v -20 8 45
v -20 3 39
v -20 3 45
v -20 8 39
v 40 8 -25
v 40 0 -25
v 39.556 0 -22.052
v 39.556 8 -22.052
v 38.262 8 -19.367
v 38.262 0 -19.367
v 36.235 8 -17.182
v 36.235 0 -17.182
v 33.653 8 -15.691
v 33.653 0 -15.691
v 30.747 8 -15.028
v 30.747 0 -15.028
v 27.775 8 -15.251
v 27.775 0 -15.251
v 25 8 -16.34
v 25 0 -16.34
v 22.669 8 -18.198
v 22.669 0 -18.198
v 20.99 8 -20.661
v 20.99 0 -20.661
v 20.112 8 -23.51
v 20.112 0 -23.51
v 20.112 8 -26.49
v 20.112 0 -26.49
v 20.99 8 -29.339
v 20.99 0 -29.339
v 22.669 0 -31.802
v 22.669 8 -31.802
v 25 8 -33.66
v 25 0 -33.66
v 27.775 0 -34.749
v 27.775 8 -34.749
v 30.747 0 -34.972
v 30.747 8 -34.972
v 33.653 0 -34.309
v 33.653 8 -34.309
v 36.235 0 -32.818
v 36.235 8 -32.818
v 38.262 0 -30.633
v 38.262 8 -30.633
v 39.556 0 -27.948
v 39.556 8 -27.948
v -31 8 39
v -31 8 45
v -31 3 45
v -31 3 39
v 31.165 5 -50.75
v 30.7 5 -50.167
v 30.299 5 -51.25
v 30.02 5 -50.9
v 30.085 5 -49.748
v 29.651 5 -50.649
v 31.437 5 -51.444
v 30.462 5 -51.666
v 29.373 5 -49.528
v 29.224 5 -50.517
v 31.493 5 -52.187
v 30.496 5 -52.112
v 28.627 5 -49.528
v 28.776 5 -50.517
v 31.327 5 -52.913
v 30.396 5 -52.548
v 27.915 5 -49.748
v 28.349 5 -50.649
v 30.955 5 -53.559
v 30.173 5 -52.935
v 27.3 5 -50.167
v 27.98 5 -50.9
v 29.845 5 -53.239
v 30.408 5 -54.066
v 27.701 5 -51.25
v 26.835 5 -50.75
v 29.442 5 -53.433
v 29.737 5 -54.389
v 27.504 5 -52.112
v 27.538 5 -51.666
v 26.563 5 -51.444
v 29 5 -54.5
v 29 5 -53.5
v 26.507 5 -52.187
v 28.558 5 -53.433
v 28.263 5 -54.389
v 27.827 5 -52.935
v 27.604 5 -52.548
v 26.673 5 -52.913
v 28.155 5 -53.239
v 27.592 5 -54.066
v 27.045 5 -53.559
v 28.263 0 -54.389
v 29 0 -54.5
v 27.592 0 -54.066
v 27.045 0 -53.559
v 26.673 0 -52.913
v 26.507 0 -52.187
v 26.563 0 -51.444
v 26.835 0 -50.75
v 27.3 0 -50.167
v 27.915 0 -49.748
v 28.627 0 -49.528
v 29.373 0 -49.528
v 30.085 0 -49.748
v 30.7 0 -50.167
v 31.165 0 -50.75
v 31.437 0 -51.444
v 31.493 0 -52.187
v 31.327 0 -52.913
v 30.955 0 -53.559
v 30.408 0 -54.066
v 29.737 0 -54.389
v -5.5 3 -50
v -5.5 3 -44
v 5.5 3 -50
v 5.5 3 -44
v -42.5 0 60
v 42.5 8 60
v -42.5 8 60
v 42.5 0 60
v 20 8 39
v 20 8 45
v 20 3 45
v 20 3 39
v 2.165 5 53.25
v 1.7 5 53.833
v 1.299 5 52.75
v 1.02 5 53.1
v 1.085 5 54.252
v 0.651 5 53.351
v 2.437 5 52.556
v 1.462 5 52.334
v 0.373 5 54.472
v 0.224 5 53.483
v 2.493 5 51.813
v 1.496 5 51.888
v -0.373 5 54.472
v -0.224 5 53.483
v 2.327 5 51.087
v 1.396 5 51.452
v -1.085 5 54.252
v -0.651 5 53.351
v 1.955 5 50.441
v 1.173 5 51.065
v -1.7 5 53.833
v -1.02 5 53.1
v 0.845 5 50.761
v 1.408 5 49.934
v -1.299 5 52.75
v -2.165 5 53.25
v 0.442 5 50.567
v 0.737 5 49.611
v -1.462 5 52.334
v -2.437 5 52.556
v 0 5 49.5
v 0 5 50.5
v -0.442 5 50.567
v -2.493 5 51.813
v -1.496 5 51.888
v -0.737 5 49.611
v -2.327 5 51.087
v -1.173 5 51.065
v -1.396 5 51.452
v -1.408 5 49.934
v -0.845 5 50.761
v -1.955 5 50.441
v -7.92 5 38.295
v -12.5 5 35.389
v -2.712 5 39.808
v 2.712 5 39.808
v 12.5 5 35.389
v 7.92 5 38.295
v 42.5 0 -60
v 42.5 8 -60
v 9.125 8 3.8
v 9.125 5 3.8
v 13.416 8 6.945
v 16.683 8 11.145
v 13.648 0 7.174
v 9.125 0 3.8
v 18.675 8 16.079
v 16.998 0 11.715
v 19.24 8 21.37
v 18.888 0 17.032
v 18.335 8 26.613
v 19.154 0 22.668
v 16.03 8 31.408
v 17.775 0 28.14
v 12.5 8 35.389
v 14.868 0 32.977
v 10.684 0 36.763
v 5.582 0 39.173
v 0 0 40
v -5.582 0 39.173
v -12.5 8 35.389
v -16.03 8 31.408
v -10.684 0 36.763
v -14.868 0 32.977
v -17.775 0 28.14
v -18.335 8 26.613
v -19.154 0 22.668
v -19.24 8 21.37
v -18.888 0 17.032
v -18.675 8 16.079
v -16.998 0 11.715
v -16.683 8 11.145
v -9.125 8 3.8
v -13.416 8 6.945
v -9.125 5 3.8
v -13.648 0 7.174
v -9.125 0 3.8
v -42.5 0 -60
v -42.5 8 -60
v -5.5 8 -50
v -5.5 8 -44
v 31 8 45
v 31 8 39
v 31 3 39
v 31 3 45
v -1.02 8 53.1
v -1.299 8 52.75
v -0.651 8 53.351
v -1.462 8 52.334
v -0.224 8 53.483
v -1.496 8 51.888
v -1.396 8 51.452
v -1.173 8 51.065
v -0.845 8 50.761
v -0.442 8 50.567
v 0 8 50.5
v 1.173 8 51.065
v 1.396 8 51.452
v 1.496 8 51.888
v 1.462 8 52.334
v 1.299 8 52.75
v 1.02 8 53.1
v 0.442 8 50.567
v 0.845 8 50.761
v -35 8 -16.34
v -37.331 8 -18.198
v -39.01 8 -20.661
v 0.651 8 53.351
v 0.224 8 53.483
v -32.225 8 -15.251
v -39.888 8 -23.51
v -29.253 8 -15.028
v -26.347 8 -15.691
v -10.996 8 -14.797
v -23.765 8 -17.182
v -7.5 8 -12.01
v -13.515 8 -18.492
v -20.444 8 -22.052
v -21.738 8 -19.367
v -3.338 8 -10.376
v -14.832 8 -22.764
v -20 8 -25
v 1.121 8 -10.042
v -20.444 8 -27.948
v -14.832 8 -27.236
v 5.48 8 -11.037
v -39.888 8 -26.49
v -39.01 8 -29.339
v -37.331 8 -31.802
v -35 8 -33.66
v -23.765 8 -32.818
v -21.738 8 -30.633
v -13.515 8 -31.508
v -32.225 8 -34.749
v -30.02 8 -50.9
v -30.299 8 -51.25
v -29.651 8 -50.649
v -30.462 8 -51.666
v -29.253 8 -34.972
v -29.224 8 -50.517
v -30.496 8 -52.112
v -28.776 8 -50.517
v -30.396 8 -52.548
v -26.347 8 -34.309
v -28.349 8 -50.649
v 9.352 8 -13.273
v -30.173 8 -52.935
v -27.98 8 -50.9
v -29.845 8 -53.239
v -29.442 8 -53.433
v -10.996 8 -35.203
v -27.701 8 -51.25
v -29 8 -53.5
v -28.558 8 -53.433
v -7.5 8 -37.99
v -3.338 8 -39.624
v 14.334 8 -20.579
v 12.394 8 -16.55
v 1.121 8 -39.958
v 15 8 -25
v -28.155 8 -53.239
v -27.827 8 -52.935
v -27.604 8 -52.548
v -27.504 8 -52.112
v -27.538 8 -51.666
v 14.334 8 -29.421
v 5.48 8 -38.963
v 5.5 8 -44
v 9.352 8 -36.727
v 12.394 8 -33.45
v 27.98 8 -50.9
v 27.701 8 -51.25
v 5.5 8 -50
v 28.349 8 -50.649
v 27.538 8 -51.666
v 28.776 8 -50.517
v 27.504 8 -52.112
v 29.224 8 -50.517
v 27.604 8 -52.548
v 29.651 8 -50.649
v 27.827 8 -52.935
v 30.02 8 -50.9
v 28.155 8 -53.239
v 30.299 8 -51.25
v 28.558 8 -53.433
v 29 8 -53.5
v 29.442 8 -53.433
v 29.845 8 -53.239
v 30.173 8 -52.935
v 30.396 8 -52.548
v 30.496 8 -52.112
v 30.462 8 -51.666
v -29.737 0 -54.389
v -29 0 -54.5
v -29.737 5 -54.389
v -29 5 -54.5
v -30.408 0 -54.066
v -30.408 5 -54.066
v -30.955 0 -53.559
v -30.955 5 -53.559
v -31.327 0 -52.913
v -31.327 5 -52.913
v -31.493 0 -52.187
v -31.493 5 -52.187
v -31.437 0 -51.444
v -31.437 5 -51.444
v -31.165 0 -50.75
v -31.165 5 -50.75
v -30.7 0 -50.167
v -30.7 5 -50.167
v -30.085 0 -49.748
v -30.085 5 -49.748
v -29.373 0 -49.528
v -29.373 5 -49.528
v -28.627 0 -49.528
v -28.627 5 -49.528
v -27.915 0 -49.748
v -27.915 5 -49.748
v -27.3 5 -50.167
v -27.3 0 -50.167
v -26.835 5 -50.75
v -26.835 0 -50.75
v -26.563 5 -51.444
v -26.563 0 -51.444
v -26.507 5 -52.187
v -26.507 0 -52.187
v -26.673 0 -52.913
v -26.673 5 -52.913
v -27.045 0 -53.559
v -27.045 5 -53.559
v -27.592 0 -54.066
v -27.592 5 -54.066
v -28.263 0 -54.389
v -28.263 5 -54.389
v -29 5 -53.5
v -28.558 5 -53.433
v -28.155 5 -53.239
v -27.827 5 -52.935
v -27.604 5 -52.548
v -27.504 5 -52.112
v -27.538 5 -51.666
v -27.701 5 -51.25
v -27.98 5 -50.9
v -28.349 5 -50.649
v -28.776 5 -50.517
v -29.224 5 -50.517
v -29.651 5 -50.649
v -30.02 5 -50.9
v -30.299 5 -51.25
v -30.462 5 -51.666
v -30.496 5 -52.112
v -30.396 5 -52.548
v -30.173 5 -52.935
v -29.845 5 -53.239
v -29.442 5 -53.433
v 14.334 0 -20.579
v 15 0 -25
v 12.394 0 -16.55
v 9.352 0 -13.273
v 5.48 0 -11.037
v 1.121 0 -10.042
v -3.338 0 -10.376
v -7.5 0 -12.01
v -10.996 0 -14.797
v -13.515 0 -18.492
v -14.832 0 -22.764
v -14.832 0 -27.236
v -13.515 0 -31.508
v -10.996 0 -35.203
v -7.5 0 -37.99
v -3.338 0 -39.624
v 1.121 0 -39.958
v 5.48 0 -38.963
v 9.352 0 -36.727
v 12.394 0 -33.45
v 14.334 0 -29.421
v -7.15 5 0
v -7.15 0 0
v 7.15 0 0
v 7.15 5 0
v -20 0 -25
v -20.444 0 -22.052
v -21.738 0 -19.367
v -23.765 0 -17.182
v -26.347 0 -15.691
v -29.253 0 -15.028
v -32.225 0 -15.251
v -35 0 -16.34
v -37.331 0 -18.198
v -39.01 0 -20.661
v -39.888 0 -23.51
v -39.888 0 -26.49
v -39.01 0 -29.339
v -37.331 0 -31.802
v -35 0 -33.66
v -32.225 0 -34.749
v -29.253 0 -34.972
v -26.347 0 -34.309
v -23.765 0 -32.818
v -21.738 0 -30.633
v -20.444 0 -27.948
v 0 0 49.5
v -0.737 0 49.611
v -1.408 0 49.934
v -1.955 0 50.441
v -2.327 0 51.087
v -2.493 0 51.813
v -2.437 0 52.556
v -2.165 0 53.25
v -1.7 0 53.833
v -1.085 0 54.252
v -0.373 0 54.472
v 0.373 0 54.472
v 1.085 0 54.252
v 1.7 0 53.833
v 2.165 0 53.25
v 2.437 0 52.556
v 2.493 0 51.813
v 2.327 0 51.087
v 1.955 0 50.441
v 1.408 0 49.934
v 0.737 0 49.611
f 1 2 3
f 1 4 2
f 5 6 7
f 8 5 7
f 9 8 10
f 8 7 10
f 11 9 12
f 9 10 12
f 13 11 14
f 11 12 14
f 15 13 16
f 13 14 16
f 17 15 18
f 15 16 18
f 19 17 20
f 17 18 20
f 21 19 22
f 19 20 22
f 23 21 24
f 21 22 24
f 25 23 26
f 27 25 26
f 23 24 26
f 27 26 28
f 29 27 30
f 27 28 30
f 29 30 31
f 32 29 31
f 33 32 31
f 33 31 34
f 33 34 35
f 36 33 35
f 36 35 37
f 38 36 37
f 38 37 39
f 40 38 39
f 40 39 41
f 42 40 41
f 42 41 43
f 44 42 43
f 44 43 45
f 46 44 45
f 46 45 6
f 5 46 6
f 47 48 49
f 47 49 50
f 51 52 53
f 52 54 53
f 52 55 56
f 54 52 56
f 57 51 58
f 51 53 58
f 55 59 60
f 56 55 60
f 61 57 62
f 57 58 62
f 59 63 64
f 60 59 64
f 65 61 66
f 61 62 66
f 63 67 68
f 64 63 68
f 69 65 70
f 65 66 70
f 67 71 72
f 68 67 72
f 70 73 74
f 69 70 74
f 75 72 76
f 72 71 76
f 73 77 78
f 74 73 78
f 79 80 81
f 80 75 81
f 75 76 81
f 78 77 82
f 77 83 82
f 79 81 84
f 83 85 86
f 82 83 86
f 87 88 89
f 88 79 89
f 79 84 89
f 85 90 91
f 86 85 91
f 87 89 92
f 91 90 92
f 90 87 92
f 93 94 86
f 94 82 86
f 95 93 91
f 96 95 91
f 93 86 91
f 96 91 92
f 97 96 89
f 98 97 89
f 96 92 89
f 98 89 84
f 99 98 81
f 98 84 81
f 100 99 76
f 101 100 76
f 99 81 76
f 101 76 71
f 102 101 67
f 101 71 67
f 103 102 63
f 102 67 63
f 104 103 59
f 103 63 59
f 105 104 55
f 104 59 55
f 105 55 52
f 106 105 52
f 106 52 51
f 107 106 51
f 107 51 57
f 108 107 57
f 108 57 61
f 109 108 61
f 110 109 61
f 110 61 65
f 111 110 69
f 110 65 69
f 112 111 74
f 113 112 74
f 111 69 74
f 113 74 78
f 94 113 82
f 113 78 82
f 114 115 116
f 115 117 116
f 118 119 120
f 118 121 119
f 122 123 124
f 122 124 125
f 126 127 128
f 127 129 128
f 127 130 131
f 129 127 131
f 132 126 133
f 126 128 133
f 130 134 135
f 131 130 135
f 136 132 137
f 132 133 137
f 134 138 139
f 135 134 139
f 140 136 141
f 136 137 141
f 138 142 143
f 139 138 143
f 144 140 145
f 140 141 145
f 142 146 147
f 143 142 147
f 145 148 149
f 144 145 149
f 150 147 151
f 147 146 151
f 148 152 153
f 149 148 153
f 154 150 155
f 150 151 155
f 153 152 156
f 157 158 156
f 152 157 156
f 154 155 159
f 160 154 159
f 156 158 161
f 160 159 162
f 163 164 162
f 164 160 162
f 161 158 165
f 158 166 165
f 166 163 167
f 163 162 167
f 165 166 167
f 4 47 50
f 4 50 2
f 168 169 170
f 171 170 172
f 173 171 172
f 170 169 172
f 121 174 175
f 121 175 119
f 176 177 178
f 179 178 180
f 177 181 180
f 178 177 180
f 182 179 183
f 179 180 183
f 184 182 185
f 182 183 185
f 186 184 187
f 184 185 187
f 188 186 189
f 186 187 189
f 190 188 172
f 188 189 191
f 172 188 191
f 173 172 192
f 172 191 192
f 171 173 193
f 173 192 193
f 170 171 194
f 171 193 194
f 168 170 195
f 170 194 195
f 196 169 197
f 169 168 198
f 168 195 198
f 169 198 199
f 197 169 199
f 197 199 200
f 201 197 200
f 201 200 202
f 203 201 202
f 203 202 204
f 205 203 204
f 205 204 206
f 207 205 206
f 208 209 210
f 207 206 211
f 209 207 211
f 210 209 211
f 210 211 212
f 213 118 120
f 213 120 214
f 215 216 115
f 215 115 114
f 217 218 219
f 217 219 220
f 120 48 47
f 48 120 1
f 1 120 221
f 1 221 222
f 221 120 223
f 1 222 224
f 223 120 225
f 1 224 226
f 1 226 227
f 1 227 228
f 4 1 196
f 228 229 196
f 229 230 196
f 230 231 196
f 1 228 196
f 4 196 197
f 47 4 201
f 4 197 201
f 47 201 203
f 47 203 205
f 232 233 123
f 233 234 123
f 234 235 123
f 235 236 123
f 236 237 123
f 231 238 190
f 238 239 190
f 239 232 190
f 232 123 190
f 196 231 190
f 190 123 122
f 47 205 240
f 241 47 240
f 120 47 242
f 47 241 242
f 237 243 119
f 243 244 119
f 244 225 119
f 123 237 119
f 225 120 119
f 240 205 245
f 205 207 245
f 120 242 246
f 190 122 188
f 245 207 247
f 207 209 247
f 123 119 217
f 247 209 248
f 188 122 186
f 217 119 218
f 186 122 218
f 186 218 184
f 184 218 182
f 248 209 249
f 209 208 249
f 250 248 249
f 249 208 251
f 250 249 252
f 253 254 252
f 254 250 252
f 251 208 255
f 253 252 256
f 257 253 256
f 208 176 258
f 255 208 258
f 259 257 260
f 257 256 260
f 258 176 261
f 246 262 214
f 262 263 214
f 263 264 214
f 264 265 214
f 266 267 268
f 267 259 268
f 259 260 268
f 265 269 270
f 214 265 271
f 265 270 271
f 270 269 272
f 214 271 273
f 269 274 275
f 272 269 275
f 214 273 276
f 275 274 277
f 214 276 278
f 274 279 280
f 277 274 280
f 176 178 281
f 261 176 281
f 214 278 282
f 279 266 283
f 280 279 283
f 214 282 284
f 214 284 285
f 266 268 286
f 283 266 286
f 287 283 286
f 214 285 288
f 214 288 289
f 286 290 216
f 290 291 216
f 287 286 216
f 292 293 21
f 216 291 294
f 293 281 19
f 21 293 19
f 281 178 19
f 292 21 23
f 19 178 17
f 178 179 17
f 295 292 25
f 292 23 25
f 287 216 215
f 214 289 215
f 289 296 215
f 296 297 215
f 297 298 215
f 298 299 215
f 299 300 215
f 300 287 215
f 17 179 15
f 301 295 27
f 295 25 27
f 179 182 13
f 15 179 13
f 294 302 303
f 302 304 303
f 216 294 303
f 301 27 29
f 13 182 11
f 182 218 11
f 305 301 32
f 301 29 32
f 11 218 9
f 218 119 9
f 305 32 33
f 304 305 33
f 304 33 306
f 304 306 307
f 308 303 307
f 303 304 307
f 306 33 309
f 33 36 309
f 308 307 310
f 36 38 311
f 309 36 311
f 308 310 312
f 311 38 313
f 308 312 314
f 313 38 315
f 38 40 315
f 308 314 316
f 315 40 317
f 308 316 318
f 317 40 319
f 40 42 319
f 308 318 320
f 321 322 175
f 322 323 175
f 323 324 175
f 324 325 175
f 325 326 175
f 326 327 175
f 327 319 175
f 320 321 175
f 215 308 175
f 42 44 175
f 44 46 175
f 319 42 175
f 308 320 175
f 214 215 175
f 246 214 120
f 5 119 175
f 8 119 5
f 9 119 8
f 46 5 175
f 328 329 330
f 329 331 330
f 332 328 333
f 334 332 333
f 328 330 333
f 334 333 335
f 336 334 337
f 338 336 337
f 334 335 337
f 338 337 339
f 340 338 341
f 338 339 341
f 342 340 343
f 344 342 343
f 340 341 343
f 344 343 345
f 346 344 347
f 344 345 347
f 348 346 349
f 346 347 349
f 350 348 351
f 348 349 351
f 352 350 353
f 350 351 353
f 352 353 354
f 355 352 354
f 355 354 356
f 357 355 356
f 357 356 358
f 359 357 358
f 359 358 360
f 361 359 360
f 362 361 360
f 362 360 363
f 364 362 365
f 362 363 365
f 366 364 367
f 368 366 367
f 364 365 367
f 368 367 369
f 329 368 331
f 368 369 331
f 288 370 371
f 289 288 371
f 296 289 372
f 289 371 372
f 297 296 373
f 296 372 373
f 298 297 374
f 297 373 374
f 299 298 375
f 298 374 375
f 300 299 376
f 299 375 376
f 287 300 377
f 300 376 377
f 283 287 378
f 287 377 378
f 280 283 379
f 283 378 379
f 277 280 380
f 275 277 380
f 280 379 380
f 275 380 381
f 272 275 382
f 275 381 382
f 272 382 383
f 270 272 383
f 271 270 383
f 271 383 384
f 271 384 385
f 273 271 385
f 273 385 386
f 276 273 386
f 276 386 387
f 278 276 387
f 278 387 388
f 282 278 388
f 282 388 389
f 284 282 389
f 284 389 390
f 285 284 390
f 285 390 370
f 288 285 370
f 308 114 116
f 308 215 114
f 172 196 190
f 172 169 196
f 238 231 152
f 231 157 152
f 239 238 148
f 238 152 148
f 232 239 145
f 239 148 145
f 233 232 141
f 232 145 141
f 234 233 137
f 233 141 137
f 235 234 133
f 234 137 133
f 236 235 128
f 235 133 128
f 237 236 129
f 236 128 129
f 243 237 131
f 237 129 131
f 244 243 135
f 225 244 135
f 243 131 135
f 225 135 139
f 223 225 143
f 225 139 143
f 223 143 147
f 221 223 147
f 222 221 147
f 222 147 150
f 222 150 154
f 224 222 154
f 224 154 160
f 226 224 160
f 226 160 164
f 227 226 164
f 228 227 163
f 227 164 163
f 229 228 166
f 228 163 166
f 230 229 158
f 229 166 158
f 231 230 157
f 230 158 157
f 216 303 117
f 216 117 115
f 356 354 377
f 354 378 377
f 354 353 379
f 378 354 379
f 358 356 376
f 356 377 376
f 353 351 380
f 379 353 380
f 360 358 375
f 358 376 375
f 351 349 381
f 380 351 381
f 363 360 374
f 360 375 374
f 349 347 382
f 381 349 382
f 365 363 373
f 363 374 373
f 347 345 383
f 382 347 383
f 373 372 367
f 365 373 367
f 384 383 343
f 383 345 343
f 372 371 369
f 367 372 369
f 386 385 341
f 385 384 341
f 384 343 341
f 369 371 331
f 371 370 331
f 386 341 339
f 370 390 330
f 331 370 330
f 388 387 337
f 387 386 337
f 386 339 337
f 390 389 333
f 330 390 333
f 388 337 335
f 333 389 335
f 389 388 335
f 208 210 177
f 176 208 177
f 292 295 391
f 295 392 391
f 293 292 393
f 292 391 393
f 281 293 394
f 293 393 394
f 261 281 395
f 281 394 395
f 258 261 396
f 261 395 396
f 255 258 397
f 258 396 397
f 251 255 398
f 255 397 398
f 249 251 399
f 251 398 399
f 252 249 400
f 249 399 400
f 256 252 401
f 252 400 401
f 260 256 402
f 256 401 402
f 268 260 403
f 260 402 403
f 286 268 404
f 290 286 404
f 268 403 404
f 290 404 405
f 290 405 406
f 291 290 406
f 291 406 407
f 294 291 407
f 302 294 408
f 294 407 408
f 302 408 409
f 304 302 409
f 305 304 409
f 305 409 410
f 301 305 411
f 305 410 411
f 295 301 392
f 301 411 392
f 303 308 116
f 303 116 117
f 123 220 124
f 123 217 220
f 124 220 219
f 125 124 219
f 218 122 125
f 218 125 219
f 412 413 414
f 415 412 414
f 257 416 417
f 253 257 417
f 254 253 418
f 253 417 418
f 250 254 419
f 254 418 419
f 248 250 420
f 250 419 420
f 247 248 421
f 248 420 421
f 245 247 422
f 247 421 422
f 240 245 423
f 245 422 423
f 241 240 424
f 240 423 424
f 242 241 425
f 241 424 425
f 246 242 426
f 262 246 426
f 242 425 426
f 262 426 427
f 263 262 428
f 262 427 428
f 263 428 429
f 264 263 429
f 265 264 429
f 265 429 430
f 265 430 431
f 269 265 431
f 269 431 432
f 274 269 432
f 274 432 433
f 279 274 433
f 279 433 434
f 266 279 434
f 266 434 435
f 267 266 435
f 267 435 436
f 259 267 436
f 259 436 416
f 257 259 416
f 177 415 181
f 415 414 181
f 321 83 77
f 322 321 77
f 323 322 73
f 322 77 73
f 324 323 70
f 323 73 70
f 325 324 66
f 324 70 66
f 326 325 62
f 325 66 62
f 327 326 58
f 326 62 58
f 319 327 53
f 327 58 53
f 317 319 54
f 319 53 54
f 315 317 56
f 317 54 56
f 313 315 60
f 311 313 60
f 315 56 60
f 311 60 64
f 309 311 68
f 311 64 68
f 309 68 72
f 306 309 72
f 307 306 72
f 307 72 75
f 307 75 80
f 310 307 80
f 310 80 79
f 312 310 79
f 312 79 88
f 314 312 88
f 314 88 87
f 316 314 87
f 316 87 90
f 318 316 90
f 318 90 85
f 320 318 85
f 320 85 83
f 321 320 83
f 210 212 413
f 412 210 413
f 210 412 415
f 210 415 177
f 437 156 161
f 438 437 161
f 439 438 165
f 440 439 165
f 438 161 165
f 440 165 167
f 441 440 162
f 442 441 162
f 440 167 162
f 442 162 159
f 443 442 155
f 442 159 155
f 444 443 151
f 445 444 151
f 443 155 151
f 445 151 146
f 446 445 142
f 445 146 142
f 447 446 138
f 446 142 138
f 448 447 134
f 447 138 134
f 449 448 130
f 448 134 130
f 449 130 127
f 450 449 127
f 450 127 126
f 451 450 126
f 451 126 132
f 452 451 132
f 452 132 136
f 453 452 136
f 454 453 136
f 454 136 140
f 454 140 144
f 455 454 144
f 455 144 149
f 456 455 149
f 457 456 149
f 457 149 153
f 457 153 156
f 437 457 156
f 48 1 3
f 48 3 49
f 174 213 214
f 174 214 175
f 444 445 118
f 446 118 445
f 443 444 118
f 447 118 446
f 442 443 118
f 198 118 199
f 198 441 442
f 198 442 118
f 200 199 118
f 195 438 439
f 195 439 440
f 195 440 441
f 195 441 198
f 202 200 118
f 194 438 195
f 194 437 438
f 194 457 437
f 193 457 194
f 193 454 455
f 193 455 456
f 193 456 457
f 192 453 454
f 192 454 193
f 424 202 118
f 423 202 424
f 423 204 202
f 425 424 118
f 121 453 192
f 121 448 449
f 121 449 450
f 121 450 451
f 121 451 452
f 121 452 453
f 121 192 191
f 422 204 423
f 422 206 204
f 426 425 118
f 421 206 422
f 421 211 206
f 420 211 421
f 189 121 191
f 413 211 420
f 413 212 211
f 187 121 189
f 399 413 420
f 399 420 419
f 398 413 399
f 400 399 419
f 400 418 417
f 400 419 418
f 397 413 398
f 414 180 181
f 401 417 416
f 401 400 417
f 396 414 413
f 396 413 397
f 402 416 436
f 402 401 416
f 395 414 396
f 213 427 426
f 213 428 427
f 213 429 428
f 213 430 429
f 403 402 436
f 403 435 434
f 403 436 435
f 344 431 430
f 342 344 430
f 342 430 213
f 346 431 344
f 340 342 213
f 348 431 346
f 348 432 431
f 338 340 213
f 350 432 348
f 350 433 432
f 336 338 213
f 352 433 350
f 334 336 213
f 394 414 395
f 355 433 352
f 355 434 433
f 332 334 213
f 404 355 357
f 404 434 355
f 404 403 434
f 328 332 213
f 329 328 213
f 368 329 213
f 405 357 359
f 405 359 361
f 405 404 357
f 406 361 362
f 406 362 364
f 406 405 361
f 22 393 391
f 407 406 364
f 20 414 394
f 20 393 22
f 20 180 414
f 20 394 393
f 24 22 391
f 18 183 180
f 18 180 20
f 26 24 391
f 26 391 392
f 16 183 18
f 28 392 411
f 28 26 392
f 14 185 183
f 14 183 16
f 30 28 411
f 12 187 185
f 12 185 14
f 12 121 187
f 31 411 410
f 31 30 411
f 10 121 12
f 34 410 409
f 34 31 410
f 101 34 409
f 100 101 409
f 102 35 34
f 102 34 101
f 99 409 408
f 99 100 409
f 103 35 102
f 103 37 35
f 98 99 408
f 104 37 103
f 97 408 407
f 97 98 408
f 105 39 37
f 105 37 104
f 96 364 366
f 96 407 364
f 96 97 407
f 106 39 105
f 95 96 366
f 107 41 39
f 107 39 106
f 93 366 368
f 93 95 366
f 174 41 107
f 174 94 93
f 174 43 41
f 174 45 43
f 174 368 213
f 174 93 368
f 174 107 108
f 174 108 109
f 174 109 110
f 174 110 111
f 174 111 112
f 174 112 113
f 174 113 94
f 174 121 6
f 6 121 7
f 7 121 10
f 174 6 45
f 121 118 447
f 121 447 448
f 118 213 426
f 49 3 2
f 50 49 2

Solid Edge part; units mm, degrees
sketch "Sketch1" plane through (0, 0, 0) normal (0, -1, 0) x (1, 0, 0)
  line L0 (-42.5, -60) -> (42.5, -60)
  line L1 (42.5, -60) -> (42.5, 60)
  line L2 (42.5, 60) -> (-42.5, 60)
  line L3 (-42.5, 60) -> (-42.5, -60)
  dimension "D1" = 85
  dimension "D2" = 120
extrude "Protrusion1" add sketch "Sketch1" against normal blind 8
sketch "Sketch2" plane through (0, 0, 0) normal (0, -1, 0) x (1, 0, 0)
  arc A0 (-9.1247, 3.8) -> (9.1247, 3.8) centre (0, 20.75) cw
  line L0 (7.15, 0) -> (9.1247, 3.8)
  line L1 (-7.15, 0) -> (7.15, 0)
  line L2 (-9.1247, 3.8) -> (-7.15, 0)
  dimension "D1" = 19.25
  dimension "D2" = 14.3
  dimension "D3" = 40
  dimension "D4" = 3.8
  dimension "D5" = 20
extrude "display_cut_1" cut sketch "Sketch2" against normal blind 5
sketch "Sketch3" plane through (0, 5, 10) normal (0, -1, 0) x (1, 0, 0)
  arc A0 (12.5, 25.3894) -> (9.1247, -6.2) centre (0, 10.75) cw
  line L0 (-9.1247, -6.2) -> (9.1247, -6.2)
  arc A1 (-12.5, 25.3894) -> (-9.1247, -6.2) centre (0, 10.75) ccw
  line L1 (-12.5, 25.3894) -> (12.5, 25.3894)
  dimension "D1" = 25
  dimension "D2" = 4.6106
extrude "Cutout1" cut sketch "Sketch3" against normal through all
sketch "Sketch4" plane through (0, 0, 0) normal (0, -1, 0) x (1, 0, 0)
  circle A0 centre (0, -25) radius 15
  circle A1 centre (-30, -25) radius 10
  circle A2 centre (30, -25) radius 10
  dimension "D1" = 30
  dimension "D2" = 35
  dimension "D3" = 20
  dimension "D4" = 80
extrude "Cutout2" cut sketch "Sketch4" against normal through all
sketch "Sketch5" plane through (0, 8, 0) normal (0, 1, 0) x (-1, 0, 0)
  line L0 (-5.5, -44) -> (5.5, -44)
  line L1 (5.5, -44) -> (5.5, -50)
  line L2 (5.5, -50) -> (-5.5, -50)
  line L3 (-5.5, -50) -> (-5.5, -44)
  line L4 (-31, 45) -> (-20, 45)
  line L5 (-20, 45) -> (-20, 39)
  line L6 (-20, 39) -> (-31, 39)
  line L7 (-31, 39) -> (-31, 45)
  line L8 (20, 45) -> (31, 45)
  line L9 (31, 45) -> (31, 39)
  line L10 (31, 39) -> (20, 39)
  line L11 (20, 39) -> (20, 45)
extrude "GY_521" cut sketch "Sketch5" against normal blind 5
hole "Bohrung_1" at (0, 0, 52) direction (0, 1, 0) diameter 3 end up to next counterbore diameter 5 counterbore depth 5
hole "Hole1" at (-29, 0, -52) direction (0, 1, 0) diameter 3 end up to next counterbore diameter 5 counterbore depth 5
hole "Hole2" at (29, 0, -52) direction (0, 1, 0) diameter 3 end up to next counterbore diameter 5 counterbore depth 5
properties material "Nylon, allgemein"
